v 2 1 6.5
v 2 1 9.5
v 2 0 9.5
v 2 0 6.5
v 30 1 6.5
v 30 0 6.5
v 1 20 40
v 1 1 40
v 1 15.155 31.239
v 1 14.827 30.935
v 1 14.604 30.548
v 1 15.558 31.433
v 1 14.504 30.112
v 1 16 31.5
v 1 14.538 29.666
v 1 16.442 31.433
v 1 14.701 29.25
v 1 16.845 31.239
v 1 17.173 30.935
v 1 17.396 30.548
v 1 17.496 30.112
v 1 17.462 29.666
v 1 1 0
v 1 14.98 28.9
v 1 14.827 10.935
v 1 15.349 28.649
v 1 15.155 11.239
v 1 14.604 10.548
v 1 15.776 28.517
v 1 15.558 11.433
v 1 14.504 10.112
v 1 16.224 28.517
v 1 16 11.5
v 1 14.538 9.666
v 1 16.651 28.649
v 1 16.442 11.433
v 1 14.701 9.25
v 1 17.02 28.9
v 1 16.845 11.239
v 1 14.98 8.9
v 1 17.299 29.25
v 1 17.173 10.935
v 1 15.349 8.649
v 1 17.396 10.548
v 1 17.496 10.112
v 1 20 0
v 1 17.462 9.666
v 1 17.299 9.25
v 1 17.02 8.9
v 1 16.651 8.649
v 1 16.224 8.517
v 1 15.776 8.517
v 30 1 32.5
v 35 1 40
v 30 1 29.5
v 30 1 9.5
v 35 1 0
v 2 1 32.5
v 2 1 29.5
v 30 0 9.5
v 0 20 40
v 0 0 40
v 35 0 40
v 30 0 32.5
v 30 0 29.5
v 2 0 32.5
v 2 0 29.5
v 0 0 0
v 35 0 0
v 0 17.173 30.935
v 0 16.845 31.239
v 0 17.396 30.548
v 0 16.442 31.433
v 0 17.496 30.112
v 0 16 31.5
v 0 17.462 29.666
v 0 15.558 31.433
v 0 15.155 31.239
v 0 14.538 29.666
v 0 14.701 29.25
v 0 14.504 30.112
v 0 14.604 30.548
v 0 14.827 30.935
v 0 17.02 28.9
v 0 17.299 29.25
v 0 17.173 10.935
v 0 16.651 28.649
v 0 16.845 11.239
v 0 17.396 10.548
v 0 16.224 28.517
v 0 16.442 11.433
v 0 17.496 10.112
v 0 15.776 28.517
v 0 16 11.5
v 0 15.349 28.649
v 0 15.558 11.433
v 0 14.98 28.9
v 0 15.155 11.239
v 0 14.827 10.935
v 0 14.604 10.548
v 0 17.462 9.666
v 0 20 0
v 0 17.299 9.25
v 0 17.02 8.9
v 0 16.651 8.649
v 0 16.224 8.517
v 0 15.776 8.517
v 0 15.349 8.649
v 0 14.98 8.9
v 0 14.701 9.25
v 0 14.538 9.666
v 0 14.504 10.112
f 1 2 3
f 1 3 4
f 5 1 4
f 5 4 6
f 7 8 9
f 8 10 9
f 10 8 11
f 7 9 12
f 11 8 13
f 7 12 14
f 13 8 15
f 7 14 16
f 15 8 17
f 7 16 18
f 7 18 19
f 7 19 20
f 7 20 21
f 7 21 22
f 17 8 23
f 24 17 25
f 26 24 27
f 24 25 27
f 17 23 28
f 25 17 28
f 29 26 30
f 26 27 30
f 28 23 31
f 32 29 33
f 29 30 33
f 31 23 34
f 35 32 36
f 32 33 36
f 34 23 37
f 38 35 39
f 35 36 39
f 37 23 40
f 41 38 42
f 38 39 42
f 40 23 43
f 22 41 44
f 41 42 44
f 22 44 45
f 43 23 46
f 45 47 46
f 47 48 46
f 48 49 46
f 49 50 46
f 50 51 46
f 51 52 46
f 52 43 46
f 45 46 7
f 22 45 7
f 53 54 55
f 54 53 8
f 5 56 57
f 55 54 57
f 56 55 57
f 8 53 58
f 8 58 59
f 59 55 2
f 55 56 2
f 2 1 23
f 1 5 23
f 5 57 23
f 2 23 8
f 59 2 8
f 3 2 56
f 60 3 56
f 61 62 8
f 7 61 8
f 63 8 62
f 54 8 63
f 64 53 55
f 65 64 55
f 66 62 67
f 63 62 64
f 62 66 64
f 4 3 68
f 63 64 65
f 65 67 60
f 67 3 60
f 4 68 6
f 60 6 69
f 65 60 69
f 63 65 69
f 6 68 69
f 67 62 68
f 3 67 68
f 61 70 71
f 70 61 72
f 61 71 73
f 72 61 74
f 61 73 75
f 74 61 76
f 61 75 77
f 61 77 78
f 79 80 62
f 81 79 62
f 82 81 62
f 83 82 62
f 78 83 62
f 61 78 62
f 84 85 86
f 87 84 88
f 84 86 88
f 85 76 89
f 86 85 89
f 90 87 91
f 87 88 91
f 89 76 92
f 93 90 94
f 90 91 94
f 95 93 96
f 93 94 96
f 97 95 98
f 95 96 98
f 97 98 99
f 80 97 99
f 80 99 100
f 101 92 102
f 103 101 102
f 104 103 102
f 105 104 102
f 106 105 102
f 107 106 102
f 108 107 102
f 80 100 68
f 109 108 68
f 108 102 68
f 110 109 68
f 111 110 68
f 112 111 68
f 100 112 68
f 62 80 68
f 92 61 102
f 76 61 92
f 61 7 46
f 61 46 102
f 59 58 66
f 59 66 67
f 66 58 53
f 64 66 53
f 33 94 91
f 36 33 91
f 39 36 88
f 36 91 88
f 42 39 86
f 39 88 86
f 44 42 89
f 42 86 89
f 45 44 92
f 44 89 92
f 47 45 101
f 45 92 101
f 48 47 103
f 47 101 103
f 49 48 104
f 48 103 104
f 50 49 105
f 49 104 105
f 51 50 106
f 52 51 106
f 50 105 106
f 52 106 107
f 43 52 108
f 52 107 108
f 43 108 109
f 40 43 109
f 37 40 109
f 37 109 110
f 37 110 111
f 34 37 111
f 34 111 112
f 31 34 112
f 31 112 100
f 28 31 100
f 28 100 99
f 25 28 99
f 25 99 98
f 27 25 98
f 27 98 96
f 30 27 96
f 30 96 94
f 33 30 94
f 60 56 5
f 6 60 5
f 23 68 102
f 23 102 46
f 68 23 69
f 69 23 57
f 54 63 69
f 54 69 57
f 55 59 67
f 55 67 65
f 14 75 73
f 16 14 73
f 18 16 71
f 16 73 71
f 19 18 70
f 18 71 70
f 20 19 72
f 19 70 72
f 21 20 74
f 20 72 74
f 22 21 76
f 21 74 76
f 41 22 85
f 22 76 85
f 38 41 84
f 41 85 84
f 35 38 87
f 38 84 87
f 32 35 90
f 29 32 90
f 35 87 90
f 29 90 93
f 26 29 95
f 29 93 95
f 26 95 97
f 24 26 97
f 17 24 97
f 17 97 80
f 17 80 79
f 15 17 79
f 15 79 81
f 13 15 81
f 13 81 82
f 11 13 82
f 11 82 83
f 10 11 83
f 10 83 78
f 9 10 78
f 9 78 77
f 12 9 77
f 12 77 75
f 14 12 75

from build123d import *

# Parameters (mm, degrees)
BOSS_EXTRUDE1_DEPTH = 40
SKETCH2_W           = 28
SKETCH2_H           = 3
CUT_EXTRUDE1_DEPTH  = 10
SKETCH3_R           = 1.5
CUT_EXTRUDE2_DEPTH  = 10


with BuildPart() as part:
    # Sketch1 → Boss-Extrude1 (new body)
    with BuildSketch(Plane.XY):
        Polygon((0, 0), (35, 0), (35, 1), (1, 1), (1, 20), (0, 20), align=None)
    extrude(amount=BOSS_EXTRUDE1_DEPTH)

    # Sketch2 → Cut-Extrude1 (cut)
    with BuildSketch(Plane(origin=(0, 1, 0), x_dir=(1, 0, 0), z_dir=(0, 1, 0))):
        with Locations((16, -8)):
            Rectangle(SKETCH2_W, SKETCH2_H)
        with Locations((16, -31)):
            Rectangle(SKETCH2_W, SKETCH2_H)
    extrude(amount=-CUT_EXTRUDE1_DEPTH, mode=Mode.SUBTRACT)

    # Sketch3 → Cut-Extrude2 (cut)
    with BuildSketch(Plane.ZY):
        with Locations((30, 16)):
            Circle(SKETCH3_R)
        with Locations((10, 16)):
            Circle(SKETCH3_R)
    extrude(amount=-CUT_EXTRUDE2_DEPTH, mode=Mode.SUBTRACT)


solid = part.part
